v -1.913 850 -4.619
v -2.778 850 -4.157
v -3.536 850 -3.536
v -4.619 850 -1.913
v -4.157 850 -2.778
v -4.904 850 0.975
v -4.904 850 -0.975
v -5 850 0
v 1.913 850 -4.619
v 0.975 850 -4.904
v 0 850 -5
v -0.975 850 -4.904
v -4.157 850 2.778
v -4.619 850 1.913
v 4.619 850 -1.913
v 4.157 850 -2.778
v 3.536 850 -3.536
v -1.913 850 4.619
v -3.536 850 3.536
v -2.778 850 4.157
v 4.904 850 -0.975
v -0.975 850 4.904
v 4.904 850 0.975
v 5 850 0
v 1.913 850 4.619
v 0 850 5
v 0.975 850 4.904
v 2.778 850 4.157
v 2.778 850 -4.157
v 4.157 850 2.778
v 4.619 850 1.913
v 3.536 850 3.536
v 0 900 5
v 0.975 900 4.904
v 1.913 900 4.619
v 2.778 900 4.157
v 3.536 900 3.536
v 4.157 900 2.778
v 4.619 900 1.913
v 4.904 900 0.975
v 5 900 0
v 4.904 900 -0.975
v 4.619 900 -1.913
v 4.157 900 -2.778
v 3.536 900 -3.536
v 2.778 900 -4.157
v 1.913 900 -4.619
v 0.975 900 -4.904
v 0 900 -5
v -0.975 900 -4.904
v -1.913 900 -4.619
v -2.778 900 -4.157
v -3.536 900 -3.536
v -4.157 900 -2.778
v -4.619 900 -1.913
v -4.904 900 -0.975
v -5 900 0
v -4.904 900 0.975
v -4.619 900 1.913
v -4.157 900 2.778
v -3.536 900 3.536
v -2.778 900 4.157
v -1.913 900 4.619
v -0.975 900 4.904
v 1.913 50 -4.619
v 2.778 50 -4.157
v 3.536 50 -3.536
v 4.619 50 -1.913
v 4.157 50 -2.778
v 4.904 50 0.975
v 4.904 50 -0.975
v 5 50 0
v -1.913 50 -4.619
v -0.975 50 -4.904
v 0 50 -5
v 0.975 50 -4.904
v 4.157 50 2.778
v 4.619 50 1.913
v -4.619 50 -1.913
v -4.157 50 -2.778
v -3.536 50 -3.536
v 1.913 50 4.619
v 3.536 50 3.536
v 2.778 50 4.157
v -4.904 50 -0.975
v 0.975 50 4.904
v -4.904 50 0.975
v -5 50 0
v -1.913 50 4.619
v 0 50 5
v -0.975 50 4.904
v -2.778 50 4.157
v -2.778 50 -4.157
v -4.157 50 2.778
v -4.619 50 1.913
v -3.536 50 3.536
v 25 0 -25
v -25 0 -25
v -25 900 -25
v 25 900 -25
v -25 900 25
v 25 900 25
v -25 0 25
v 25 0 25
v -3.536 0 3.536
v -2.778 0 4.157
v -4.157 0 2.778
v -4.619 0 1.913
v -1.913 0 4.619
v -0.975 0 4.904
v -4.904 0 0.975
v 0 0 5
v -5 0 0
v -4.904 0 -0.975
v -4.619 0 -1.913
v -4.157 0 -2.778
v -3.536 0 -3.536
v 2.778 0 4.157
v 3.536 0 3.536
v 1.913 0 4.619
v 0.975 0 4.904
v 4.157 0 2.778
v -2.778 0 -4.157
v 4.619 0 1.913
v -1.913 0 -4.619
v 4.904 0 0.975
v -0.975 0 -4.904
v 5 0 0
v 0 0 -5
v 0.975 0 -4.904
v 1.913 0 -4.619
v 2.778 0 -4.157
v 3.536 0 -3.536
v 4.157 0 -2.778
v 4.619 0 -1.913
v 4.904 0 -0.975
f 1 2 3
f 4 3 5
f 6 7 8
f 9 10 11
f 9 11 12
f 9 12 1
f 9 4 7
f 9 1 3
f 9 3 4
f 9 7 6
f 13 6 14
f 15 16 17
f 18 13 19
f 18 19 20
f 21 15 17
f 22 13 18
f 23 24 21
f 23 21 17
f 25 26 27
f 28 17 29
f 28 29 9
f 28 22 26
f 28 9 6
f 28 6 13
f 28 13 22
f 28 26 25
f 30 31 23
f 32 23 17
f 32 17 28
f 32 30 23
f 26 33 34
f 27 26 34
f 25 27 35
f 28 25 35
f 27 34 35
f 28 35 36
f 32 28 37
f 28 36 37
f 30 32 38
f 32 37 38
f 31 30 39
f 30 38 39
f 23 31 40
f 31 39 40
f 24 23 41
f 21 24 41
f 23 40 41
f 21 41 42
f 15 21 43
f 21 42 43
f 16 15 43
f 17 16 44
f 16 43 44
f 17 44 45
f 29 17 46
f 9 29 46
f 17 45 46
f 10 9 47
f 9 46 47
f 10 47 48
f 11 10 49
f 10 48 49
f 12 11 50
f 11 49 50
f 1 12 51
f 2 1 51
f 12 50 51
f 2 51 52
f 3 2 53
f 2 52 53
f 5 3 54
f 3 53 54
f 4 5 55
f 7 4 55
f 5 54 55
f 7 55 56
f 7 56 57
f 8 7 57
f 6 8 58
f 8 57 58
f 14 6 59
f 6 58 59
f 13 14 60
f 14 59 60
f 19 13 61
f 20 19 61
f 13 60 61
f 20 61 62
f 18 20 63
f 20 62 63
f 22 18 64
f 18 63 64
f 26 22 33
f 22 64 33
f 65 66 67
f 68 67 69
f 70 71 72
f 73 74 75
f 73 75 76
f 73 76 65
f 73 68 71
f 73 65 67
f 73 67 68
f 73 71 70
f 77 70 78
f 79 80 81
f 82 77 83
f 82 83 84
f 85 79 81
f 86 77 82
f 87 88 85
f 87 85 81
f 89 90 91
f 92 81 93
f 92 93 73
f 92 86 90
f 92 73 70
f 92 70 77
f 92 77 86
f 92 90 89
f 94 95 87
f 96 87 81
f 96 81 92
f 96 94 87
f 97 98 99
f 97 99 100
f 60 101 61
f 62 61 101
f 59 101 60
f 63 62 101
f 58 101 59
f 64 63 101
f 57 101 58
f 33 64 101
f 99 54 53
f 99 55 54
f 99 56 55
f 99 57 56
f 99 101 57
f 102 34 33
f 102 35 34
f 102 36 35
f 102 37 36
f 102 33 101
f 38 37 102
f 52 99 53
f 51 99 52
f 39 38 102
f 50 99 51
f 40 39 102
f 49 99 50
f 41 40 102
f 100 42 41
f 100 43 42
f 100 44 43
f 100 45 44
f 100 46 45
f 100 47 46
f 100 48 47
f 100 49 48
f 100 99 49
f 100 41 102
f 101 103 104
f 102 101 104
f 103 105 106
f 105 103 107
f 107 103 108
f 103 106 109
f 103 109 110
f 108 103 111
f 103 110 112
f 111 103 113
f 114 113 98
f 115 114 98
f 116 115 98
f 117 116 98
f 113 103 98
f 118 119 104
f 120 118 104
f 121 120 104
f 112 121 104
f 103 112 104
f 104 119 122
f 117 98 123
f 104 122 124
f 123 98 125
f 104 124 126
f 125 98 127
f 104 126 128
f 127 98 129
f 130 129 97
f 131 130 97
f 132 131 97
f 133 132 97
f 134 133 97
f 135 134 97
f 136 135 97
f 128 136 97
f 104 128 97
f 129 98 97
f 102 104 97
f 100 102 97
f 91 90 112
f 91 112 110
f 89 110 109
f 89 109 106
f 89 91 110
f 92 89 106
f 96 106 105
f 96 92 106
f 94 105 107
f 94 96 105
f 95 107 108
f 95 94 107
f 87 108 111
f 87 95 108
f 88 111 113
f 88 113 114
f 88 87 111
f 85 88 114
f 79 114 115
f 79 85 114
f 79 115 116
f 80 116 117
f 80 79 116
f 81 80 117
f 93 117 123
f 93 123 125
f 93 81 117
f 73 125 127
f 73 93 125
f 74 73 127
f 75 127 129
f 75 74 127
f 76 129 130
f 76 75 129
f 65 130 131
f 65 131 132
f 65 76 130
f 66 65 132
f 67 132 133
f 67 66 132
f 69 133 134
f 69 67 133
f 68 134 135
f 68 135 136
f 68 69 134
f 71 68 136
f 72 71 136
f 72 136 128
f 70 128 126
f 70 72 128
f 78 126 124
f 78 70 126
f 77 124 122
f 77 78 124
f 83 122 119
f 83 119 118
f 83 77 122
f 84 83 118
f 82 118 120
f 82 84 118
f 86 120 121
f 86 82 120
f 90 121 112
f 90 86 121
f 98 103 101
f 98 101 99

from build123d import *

# Parameters (mm, degrees)
SKETCH_1_W          = 50
SKETCH_1_H          = 50
EXTRUDE_2_DEPTH     = 900
SKETCH_4_R          = 5
CUT_EXTRUDE_2_DEPTH = 50
CUT_EXTRUDE_START   = -50
SKETCH_5_R          = 5
CUT_EXTRUDE_3_DEPTH = 50


with BuildPart() as part:
    # Эскиз1 → Бобышка-Вытянуть2 (new body)
    with BuildSketch(Plane(origin=(0, 0, 0), x_dir=(1, 0, 0), z_dir=(0, 1, 0))):
        Rectangle(SKETCH_1_W, SKETCH_1_H)
    extrude(amount=EXTRUDE_2_DEPTH)

    # Эскиз4 → Вырез-Вытянуть2 (cut)
    with BuildSketch(Plane(origin=(0, 900, 0), x_dir=(1, 0, 0), z_dir=(0, 1, 0))):
        with Locations(Location((0, 0, 0), (0, 0, 270))):
            Circle(SKETCH_4_R)
    extrude(amount=-CUT_EXTRUDE_2_DEPTH, mode=Mode.SUBTRACT)

    # Эскиз5 → Вырез-Вытянуть3 (cut)
    with BuildSketch(Plane.XZ.offset(CUT_EXTRUDE_START)):
        with Locations(Location((0, 0, 0), (0, 0, 90))):
            Circle(SKETCH_5_R)
    extrude(amount=CUT_EXTRUDE_3_DEPTH, mode=Mode.SUBTRACT)


solid = part.part
